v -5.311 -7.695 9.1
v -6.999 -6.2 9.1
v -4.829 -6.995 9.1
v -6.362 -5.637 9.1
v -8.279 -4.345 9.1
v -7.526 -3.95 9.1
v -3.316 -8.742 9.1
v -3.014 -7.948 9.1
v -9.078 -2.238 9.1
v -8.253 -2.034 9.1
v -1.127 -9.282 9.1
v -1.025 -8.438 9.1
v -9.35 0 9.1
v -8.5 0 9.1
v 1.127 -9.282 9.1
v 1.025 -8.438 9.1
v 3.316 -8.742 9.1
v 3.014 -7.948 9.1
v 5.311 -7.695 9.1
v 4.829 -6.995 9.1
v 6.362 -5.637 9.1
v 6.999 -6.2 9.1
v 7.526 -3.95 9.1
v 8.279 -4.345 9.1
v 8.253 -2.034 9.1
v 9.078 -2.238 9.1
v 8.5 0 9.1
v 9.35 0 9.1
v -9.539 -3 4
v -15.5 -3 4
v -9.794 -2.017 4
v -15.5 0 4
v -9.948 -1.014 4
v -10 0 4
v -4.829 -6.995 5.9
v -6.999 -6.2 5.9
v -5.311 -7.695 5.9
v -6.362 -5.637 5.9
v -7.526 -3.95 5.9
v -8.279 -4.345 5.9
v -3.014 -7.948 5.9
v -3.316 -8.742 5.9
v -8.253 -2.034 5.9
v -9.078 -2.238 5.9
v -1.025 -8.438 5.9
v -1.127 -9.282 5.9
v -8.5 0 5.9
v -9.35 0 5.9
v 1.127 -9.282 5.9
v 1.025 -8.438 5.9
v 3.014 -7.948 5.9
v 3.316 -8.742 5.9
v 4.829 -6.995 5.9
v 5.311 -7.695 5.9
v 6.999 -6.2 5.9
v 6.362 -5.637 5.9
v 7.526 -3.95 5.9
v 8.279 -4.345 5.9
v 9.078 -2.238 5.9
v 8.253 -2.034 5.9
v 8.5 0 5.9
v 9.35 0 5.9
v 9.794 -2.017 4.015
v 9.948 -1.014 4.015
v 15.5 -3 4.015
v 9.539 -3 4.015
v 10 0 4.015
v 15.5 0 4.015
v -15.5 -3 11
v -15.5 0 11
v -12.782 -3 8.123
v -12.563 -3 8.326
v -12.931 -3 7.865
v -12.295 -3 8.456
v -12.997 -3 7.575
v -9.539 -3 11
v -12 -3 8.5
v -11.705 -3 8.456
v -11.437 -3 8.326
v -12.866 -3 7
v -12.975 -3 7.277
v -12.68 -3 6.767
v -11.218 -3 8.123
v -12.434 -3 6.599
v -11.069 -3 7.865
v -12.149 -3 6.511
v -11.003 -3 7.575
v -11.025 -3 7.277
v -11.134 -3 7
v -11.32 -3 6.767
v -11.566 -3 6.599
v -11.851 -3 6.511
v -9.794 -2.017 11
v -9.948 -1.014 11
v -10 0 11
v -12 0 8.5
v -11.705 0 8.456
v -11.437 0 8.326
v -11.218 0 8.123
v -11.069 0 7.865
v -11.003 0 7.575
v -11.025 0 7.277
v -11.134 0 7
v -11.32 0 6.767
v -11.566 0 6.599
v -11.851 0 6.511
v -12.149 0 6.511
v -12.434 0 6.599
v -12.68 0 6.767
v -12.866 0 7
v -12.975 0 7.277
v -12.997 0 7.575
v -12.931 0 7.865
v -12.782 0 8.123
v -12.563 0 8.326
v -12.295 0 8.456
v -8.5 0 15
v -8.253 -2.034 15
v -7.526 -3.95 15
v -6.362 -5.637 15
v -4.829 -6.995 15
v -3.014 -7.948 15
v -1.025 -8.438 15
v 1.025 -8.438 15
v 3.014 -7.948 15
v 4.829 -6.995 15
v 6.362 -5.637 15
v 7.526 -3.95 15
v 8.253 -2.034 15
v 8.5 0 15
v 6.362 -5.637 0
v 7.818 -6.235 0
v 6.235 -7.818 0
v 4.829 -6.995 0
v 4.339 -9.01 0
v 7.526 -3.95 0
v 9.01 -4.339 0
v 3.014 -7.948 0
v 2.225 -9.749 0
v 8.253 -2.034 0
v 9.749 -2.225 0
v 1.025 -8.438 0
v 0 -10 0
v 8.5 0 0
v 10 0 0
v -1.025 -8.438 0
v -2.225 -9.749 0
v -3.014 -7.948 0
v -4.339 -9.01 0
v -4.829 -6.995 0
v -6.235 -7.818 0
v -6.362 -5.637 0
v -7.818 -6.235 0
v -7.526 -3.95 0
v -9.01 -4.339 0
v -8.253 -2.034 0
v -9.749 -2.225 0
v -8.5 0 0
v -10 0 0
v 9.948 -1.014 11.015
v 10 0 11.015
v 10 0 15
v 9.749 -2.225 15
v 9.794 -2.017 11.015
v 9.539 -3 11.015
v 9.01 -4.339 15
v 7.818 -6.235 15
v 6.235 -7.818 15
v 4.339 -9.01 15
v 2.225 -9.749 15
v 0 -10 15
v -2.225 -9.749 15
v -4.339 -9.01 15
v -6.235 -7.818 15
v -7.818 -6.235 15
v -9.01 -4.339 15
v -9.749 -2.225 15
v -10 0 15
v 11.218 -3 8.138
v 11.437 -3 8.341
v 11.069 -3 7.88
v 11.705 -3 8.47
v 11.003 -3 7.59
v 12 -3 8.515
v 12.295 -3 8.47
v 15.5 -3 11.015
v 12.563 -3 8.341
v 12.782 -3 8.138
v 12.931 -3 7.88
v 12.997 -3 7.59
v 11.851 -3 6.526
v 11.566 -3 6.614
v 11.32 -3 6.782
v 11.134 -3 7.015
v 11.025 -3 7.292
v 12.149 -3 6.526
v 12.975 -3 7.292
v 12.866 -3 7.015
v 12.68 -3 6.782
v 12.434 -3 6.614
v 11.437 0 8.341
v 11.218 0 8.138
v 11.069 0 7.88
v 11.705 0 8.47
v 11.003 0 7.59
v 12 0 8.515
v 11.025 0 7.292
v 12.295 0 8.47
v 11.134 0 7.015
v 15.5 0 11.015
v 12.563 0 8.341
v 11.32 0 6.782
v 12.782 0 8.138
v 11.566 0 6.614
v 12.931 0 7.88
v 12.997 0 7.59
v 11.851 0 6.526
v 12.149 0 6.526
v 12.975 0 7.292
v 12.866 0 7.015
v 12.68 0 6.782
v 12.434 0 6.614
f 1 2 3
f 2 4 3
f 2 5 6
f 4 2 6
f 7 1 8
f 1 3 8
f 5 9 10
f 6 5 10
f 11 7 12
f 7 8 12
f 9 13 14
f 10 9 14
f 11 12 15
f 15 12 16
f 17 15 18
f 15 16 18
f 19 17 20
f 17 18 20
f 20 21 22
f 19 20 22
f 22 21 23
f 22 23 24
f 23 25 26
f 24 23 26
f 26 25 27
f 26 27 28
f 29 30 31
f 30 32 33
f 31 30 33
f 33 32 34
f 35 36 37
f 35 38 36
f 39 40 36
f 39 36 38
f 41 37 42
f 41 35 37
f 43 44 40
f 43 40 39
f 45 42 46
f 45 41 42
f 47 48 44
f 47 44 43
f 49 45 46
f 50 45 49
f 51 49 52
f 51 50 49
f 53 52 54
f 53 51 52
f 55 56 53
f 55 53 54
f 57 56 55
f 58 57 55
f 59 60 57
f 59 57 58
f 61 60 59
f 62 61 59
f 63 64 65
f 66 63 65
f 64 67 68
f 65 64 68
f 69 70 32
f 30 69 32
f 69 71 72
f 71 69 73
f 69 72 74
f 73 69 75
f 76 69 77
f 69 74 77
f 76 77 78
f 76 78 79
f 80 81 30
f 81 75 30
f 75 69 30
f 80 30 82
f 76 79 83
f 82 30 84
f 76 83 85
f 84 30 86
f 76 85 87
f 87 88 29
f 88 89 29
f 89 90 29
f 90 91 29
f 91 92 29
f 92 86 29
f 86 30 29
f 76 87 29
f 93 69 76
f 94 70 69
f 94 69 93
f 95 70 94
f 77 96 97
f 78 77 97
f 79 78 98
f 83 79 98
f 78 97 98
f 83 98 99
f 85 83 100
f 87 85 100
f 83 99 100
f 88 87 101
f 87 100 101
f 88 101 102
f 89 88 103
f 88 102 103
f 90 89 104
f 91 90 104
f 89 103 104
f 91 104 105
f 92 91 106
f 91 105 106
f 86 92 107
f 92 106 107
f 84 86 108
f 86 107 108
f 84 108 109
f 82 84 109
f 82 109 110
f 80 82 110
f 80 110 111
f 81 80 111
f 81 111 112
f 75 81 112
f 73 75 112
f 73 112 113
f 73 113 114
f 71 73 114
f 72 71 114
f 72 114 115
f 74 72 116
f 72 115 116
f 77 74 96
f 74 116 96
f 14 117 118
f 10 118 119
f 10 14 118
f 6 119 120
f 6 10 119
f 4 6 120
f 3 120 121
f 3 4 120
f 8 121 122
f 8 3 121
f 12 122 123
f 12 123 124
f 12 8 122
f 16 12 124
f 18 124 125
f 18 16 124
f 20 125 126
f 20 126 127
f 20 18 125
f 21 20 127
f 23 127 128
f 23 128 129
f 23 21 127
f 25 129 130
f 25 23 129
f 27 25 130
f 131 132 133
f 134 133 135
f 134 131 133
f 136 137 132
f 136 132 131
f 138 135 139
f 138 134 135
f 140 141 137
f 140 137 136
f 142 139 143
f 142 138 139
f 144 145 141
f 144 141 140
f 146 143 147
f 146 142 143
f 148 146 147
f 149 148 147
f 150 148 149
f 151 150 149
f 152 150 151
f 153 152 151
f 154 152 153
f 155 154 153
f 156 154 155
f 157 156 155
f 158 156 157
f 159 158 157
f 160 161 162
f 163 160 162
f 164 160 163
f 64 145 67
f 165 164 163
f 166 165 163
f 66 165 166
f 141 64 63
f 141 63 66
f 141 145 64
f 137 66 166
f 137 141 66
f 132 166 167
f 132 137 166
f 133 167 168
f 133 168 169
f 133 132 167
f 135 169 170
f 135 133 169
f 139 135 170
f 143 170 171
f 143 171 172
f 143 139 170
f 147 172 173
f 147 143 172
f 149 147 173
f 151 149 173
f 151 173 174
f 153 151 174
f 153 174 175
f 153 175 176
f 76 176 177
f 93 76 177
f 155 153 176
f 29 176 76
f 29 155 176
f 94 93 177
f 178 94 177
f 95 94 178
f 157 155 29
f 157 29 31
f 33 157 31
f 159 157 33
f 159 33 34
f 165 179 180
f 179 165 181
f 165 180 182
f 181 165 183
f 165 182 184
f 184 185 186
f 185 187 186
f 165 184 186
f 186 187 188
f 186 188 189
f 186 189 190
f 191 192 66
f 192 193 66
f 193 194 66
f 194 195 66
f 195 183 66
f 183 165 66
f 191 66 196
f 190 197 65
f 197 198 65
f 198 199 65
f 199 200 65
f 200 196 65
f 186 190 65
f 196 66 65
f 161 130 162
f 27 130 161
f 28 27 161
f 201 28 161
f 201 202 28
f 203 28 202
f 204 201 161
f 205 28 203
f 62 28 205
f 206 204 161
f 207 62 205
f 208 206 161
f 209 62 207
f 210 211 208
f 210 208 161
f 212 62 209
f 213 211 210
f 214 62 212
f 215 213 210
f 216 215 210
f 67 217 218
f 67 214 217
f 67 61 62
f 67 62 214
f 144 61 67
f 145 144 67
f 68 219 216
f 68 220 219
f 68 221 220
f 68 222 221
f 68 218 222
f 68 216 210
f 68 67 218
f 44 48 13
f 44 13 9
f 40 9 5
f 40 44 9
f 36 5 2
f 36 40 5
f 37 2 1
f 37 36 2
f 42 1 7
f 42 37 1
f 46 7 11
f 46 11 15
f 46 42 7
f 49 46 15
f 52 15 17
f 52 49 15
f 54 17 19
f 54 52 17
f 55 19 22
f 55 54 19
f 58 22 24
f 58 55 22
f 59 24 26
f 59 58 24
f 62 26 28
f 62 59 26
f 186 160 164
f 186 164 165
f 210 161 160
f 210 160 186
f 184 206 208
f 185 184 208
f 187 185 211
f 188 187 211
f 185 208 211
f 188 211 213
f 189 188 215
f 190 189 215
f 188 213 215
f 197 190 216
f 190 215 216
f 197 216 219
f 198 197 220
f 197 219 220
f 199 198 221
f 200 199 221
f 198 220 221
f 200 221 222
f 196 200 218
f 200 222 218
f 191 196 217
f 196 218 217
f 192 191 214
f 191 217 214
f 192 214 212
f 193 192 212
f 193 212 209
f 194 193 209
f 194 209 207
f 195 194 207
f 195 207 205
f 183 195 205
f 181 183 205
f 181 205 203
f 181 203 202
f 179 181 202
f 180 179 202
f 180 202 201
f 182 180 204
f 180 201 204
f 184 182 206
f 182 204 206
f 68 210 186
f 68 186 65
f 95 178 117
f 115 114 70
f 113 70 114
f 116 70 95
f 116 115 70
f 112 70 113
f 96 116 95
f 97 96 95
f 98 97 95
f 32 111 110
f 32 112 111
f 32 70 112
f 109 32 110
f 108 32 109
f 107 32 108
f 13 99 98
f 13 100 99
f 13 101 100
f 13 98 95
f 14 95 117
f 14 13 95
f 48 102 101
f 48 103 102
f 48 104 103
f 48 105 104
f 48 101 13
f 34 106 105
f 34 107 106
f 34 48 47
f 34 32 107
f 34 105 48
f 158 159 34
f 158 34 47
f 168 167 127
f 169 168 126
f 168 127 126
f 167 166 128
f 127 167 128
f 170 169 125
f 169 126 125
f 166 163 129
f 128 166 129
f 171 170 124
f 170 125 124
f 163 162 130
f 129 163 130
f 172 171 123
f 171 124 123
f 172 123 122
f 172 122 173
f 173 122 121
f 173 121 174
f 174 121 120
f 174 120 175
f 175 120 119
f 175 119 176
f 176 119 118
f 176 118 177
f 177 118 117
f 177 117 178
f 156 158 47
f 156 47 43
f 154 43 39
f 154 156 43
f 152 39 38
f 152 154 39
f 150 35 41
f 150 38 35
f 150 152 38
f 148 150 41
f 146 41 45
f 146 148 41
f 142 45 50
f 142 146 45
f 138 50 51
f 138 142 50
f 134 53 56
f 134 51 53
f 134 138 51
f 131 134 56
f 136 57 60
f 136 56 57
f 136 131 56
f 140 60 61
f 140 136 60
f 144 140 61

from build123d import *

# Parameters (mm, degrees)
BOSS_EXTRUDE1_DEPTH = 15
SKETCH2_W           = 7
SKETCH2_H           = 7
SKETCH2_R           = 1
BOSS_EXTRUDE2_DEPTH = 3
CUT_EXTRUDE1_DEPTH  = 1.6


with BuildPart() as part:
    # Sketch1 → Boss-Extrude1 (new body)
    with BuildSketch(Plane.XY):
        with BuildLine():
            Line((-10, 0), (-8.5, 0))
            ThreePointArc((-8.5, 0), (0, -8.5), (8.5, 0))
            Line((8.5, 0), (10, 0))
            ThreePointArc((10, 0), (0, -10), (-10, 0))
        make_face()
    extrude(amount=BOSS_EXTRUDE1_DEPTH)

    # Sketch2 → Boss-Extrude2 (add)
    # profile 1 of 2: a face of its own
    with BuildSketch(Plane(origin=(0, 0, 0), x_dir=(1, 0, 0), z_dir=(0, 1, 0))):
        with Locations((-12, -7.5)):
            Rectangle(SKETCH2_W, SKETCH2_H)
        with Locations(Location((-12, -7.5, 0), (0, 0, 270))):
            Circle(SKETCH2_R, mode=Mode.SUBTRACT)
    # profile 2 of 2: a face of its own
    with BuildSketch(Plane(origin=(0, 0, 0), x_dir=(1, 0, 0), z_dir=(0, 1, 0))):
        with Locations((12, -7.514851196)):
            Rectangle(SKETCH2_W, SKETCH2_H)
        with Locations(Location((12, -7.514851196, 0), (0, 0, 270))):
            Circle(SKETCH2_R, mode=Mode.SUBTRACT)
    extrude(amount=-BOSS_EXTRUDE2_DEPTH)

    # Sketch3 → Cut-Extrude1 (cut, symmetric)
    with BuildSketch(Plane(origin=(0, 0, 7.5), x_dir=(-1, 0, 0), z_dir=(0, 0, -1))):
        with BuildLine():
            Line((-9.35, 0), (-8.5, 0))
            ThreePointArc((-8.5, 0), (0, -8.5), (8.5, 0))
            Line((8.5, 0), (9.35, 0))
            ThreePointArc((9.35, 0), (0, -9.35), (-9.35, 0))
        make_face()
    extrude(amount=CUT_EXTRUDE1_DEPTH, both=True, mode=Mode.SUBTRACT)


solid = part.part
